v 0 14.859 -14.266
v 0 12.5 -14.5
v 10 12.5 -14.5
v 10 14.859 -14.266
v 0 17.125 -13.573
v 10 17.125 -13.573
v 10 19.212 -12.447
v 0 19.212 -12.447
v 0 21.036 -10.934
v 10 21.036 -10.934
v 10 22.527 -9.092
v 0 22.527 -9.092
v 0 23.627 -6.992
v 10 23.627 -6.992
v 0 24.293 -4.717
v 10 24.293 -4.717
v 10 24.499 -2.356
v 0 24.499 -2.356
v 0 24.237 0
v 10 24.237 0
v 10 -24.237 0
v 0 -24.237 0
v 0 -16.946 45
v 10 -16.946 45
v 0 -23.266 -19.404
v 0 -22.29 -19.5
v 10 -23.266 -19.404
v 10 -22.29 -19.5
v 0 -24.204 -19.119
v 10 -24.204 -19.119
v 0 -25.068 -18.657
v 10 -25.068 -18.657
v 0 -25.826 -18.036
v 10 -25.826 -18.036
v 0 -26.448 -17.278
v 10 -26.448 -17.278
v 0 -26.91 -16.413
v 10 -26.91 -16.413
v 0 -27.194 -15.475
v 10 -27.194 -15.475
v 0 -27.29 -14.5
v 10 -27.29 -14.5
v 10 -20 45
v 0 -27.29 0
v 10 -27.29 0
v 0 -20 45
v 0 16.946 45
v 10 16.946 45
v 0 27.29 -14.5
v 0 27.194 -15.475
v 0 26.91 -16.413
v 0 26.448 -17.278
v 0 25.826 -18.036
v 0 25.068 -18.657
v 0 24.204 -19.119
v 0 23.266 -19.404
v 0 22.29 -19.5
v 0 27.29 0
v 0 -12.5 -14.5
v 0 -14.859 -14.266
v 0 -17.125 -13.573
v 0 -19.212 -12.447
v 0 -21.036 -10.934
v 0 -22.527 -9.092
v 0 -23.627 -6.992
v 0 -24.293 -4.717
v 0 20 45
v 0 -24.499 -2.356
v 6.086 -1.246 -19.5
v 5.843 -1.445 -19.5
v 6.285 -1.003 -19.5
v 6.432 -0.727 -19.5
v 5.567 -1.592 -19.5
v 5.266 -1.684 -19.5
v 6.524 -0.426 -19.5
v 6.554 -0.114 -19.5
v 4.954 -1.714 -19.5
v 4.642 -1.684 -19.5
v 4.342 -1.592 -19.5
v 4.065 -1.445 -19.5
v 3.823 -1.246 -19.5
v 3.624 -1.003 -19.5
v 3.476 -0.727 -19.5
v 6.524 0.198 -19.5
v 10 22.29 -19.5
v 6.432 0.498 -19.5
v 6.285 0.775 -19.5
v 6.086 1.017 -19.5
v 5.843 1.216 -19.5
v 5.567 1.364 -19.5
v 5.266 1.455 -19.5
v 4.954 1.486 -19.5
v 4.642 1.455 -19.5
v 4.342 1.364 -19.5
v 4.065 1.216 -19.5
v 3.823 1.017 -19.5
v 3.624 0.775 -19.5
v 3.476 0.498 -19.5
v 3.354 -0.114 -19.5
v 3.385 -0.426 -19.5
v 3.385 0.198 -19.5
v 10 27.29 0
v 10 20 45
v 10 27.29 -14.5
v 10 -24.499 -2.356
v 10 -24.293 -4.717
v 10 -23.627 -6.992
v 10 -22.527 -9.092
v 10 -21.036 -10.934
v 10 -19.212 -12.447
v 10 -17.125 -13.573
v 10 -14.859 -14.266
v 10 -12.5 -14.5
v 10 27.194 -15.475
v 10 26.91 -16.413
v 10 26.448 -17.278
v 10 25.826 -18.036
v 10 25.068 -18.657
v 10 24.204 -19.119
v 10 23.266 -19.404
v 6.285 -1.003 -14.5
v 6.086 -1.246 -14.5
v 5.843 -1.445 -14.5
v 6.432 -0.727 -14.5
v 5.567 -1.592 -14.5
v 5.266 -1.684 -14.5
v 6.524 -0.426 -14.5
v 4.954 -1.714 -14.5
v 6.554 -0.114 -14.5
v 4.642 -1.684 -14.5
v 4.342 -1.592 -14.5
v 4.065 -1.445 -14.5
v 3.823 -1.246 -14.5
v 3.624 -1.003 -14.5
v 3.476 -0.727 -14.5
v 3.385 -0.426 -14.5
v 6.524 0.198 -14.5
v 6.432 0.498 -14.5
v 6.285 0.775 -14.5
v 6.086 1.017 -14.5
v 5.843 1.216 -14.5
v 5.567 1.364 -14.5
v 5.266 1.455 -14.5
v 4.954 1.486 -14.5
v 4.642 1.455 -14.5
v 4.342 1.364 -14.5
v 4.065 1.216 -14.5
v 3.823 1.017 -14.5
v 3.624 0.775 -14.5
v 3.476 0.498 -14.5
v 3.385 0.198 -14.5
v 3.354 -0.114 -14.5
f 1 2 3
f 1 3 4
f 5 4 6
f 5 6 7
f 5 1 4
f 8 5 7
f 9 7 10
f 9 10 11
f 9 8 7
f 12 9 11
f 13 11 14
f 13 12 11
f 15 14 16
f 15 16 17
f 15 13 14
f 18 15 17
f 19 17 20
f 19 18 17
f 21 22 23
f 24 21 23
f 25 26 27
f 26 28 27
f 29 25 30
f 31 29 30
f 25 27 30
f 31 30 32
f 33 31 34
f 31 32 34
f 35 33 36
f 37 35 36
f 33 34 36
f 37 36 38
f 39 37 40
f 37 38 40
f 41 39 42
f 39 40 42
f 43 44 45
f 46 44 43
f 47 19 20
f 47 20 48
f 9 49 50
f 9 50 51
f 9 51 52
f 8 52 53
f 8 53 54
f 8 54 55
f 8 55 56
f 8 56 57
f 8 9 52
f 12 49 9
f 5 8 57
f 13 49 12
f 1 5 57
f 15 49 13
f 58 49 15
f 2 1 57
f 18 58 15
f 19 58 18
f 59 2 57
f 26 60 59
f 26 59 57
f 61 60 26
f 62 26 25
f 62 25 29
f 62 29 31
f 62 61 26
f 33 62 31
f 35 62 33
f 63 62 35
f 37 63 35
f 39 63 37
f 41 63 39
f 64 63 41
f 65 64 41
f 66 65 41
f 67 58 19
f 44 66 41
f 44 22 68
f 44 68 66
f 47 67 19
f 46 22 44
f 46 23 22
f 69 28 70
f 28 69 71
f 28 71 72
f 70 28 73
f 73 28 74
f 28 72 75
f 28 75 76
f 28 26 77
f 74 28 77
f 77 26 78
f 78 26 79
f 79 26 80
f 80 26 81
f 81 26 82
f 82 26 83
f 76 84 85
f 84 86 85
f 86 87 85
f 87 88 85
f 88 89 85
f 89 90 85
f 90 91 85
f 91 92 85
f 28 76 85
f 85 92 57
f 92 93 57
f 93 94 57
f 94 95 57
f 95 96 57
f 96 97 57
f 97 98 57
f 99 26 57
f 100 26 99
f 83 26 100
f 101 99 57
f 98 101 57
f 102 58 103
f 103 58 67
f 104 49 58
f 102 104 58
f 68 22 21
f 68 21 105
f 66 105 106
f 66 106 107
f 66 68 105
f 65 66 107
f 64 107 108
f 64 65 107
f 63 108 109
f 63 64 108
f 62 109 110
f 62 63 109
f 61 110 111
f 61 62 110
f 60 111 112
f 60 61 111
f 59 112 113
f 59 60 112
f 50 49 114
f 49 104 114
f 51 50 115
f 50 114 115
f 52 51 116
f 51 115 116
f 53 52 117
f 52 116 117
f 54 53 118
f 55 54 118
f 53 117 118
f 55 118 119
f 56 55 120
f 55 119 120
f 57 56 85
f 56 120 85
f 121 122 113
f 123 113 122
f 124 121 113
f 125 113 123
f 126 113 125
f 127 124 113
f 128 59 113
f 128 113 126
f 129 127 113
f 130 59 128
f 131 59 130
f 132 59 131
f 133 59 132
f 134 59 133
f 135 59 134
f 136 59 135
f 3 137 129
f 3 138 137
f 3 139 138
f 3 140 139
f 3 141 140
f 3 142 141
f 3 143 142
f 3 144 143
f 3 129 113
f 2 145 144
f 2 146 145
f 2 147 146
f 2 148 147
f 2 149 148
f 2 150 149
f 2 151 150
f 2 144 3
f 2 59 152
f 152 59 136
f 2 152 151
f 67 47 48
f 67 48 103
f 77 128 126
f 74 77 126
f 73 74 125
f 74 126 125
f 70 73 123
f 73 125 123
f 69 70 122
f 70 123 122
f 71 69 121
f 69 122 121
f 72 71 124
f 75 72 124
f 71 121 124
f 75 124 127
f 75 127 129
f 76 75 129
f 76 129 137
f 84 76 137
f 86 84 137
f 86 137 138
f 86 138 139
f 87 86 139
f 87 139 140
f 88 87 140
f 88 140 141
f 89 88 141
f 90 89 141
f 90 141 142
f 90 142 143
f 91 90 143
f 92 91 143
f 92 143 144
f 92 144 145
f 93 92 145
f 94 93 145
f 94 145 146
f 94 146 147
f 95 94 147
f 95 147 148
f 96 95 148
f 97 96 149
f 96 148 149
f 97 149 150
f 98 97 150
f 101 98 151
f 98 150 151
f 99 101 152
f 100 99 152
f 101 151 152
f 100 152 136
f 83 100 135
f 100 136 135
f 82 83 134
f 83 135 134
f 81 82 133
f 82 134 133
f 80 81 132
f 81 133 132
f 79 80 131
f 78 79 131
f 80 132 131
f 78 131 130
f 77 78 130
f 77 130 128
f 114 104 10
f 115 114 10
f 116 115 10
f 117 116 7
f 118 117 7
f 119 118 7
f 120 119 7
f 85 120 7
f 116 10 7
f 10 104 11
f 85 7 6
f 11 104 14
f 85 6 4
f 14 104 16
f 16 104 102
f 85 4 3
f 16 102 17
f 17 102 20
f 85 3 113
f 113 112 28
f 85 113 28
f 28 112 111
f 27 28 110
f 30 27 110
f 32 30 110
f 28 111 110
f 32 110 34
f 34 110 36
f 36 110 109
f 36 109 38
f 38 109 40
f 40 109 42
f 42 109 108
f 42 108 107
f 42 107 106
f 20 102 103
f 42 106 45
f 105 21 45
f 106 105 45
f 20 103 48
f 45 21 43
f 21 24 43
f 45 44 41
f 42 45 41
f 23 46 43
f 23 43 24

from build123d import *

# Parameters (mm, degrees)
PAD_DEPTH    = 10
FILLET_R     = 5
SKETCH001_R  = 1.6
POCKET_DEPTH = 5.001


with BuildPart() as part:
    # Sketch → Pad (new body)
    with BuildSketch(Plane.YZ):
        with BuildLine():
            Line((-12.5, -14.5), (12.5, -14.5))
            ThreePointArc((12.5, -14.5), (21.827379, -10.049834), (24.236695, 0))
            Line((24.236695, 0), (16.946495, 45))
            Line((16.946495, 45), (20, 45))
            Line((27.290199, 0), (20, 45))
            Line((27.290199, -19.5), (27.290199, 0))
            Line((-27.290199, -19.5), (27.290199, -19.5))
            Line((-27.290199, 0), (-27.290199, -19.5))
            Line((-27.290199, 0), (-20, 45))
            Line((-20, 45), (-16.946495, 45))
            Line((-24.236695, 0), (-16.946495, 45))
            ThreePointArc((-24.236695, 0), (-21.827379, -10.049834), (-12.5, -14.5))
        make_face()
    extrude(amount=PAD_DEPTH)

    # Fillet
    fillet_edges = [part.edges().sort_by_distance(p)[0] for p in [
        (5, -27.290199, -19.5),
        (5, 27.290199, -19.5),
    ]]
    fillet(fillet_edges, radius=FILLET_R)

    # Sketch001 (on Face13 of Fillet) → Pocket (cut, through all)
    with BuildSketch(Plane(origin=(0, 0, -14.5), x_dir=(0, -1, 0), z_dir=(0, 0, 1))):
        with Locations((0.11428, 4.954288)):
            Circle(SKETCH001_R)
    extrude(amount=-POCKET_DEPTH, mode=Mode.SUBTRACT)


solid = part.part
